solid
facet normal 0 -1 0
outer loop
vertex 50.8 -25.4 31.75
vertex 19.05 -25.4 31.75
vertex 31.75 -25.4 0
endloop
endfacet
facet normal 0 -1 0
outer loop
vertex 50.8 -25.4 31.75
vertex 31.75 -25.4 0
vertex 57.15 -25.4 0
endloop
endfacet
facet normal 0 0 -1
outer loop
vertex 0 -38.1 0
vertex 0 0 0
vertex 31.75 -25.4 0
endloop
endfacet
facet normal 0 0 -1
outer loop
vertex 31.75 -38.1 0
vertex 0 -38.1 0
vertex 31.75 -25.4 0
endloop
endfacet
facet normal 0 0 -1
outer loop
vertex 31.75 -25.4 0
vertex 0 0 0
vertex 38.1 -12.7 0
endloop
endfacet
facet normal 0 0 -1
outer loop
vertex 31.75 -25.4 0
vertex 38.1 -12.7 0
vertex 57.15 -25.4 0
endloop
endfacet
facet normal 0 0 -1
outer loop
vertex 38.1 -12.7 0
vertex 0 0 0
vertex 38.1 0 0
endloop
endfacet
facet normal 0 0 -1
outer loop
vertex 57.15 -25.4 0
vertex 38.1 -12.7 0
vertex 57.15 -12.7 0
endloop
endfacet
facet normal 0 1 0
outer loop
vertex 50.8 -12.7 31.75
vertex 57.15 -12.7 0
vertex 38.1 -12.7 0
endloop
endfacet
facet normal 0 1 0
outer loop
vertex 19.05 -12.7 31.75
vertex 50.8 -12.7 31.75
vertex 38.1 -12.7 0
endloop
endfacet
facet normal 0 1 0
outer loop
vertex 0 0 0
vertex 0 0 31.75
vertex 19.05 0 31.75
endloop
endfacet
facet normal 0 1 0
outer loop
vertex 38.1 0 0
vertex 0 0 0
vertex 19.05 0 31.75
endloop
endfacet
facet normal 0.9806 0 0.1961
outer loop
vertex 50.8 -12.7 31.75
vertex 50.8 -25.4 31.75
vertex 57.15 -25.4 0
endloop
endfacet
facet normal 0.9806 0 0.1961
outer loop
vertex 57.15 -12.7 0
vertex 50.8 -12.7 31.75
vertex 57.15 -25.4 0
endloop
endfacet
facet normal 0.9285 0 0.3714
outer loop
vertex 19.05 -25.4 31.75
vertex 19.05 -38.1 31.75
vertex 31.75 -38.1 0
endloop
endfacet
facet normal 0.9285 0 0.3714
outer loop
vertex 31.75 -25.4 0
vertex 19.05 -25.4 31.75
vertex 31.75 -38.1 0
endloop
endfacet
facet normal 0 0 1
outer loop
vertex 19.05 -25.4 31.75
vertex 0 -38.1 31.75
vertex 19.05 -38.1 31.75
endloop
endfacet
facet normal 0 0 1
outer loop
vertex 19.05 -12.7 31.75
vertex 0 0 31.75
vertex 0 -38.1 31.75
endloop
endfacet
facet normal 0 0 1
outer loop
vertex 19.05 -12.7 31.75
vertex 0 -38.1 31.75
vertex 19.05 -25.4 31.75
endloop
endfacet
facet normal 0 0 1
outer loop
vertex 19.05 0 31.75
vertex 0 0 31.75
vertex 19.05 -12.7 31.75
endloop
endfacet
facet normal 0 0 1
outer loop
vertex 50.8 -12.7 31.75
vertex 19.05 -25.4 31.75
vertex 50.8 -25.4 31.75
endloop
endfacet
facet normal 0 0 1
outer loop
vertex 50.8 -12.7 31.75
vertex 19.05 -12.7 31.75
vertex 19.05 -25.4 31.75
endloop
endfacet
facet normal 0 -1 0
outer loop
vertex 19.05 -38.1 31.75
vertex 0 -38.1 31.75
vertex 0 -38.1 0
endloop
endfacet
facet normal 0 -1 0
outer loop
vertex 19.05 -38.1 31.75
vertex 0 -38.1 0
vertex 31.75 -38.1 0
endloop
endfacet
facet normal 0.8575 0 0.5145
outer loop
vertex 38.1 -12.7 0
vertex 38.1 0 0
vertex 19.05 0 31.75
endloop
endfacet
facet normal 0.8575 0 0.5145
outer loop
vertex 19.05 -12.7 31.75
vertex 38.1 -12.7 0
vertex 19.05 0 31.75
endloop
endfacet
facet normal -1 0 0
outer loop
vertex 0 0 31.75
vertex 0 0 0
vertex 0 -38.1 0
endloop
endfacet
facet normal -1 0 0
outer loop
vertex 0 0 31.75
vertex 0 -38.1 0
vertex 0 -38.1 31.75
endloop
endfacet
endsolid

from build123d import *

# Parameters (mm, degrees)
F0_W     = 57.15
F0_H     = 31.75
F1_DEPTH = 38.1
F3_DEPTH = 12.7
F5_DEPTH = 12.7
F7_DEPTH = 12.7


with BuildPart() as f1:
    # F0 (on Front) → F1 (new body)
    with BuildSketch(Plane.XZ):
        with Locations((28.575, 15.875)):
            Rectangle(F0_W, F0_H)
    extrude(amount=F1_DEPTH)

    # F2 (on face) → F3 (cut)
    with BuildSketch(Plane.XZ.offset(38.1)):
        Polygon((57.15, 31.75), (19.05, 31.75), (31.75, 0), (57.15, 0), align=None)
    extrude(amount=-F3_DEPTH, mode=Mode.SUBTRACT)

    # F4 (on face) → F5 (cut)
    with BuildSketch(Plane.XZ.offset(25.4)):
        Polygon((57.15, 31.75), (50.8, 31.75), (57.15, 0), align=None)
    extrude(amount=-F5_DEPTH, mode=Mode.SUBTRACT)

    # F6 (on face) → F7 (cut)
    with BuildSketch(Plane(origin=(0, 0, 0), x_dir=(-1, 0, 0), z_dir=(0, 1, 0))):
        Polygon((-38.1, 0), (-19.05, 31.75), (-57.15, 31.75), (-57.15, 0), align=None)
    extrude(amount=-F7_DEPTH, mode=Mode.SUBTRACT)


solid = f1.part
